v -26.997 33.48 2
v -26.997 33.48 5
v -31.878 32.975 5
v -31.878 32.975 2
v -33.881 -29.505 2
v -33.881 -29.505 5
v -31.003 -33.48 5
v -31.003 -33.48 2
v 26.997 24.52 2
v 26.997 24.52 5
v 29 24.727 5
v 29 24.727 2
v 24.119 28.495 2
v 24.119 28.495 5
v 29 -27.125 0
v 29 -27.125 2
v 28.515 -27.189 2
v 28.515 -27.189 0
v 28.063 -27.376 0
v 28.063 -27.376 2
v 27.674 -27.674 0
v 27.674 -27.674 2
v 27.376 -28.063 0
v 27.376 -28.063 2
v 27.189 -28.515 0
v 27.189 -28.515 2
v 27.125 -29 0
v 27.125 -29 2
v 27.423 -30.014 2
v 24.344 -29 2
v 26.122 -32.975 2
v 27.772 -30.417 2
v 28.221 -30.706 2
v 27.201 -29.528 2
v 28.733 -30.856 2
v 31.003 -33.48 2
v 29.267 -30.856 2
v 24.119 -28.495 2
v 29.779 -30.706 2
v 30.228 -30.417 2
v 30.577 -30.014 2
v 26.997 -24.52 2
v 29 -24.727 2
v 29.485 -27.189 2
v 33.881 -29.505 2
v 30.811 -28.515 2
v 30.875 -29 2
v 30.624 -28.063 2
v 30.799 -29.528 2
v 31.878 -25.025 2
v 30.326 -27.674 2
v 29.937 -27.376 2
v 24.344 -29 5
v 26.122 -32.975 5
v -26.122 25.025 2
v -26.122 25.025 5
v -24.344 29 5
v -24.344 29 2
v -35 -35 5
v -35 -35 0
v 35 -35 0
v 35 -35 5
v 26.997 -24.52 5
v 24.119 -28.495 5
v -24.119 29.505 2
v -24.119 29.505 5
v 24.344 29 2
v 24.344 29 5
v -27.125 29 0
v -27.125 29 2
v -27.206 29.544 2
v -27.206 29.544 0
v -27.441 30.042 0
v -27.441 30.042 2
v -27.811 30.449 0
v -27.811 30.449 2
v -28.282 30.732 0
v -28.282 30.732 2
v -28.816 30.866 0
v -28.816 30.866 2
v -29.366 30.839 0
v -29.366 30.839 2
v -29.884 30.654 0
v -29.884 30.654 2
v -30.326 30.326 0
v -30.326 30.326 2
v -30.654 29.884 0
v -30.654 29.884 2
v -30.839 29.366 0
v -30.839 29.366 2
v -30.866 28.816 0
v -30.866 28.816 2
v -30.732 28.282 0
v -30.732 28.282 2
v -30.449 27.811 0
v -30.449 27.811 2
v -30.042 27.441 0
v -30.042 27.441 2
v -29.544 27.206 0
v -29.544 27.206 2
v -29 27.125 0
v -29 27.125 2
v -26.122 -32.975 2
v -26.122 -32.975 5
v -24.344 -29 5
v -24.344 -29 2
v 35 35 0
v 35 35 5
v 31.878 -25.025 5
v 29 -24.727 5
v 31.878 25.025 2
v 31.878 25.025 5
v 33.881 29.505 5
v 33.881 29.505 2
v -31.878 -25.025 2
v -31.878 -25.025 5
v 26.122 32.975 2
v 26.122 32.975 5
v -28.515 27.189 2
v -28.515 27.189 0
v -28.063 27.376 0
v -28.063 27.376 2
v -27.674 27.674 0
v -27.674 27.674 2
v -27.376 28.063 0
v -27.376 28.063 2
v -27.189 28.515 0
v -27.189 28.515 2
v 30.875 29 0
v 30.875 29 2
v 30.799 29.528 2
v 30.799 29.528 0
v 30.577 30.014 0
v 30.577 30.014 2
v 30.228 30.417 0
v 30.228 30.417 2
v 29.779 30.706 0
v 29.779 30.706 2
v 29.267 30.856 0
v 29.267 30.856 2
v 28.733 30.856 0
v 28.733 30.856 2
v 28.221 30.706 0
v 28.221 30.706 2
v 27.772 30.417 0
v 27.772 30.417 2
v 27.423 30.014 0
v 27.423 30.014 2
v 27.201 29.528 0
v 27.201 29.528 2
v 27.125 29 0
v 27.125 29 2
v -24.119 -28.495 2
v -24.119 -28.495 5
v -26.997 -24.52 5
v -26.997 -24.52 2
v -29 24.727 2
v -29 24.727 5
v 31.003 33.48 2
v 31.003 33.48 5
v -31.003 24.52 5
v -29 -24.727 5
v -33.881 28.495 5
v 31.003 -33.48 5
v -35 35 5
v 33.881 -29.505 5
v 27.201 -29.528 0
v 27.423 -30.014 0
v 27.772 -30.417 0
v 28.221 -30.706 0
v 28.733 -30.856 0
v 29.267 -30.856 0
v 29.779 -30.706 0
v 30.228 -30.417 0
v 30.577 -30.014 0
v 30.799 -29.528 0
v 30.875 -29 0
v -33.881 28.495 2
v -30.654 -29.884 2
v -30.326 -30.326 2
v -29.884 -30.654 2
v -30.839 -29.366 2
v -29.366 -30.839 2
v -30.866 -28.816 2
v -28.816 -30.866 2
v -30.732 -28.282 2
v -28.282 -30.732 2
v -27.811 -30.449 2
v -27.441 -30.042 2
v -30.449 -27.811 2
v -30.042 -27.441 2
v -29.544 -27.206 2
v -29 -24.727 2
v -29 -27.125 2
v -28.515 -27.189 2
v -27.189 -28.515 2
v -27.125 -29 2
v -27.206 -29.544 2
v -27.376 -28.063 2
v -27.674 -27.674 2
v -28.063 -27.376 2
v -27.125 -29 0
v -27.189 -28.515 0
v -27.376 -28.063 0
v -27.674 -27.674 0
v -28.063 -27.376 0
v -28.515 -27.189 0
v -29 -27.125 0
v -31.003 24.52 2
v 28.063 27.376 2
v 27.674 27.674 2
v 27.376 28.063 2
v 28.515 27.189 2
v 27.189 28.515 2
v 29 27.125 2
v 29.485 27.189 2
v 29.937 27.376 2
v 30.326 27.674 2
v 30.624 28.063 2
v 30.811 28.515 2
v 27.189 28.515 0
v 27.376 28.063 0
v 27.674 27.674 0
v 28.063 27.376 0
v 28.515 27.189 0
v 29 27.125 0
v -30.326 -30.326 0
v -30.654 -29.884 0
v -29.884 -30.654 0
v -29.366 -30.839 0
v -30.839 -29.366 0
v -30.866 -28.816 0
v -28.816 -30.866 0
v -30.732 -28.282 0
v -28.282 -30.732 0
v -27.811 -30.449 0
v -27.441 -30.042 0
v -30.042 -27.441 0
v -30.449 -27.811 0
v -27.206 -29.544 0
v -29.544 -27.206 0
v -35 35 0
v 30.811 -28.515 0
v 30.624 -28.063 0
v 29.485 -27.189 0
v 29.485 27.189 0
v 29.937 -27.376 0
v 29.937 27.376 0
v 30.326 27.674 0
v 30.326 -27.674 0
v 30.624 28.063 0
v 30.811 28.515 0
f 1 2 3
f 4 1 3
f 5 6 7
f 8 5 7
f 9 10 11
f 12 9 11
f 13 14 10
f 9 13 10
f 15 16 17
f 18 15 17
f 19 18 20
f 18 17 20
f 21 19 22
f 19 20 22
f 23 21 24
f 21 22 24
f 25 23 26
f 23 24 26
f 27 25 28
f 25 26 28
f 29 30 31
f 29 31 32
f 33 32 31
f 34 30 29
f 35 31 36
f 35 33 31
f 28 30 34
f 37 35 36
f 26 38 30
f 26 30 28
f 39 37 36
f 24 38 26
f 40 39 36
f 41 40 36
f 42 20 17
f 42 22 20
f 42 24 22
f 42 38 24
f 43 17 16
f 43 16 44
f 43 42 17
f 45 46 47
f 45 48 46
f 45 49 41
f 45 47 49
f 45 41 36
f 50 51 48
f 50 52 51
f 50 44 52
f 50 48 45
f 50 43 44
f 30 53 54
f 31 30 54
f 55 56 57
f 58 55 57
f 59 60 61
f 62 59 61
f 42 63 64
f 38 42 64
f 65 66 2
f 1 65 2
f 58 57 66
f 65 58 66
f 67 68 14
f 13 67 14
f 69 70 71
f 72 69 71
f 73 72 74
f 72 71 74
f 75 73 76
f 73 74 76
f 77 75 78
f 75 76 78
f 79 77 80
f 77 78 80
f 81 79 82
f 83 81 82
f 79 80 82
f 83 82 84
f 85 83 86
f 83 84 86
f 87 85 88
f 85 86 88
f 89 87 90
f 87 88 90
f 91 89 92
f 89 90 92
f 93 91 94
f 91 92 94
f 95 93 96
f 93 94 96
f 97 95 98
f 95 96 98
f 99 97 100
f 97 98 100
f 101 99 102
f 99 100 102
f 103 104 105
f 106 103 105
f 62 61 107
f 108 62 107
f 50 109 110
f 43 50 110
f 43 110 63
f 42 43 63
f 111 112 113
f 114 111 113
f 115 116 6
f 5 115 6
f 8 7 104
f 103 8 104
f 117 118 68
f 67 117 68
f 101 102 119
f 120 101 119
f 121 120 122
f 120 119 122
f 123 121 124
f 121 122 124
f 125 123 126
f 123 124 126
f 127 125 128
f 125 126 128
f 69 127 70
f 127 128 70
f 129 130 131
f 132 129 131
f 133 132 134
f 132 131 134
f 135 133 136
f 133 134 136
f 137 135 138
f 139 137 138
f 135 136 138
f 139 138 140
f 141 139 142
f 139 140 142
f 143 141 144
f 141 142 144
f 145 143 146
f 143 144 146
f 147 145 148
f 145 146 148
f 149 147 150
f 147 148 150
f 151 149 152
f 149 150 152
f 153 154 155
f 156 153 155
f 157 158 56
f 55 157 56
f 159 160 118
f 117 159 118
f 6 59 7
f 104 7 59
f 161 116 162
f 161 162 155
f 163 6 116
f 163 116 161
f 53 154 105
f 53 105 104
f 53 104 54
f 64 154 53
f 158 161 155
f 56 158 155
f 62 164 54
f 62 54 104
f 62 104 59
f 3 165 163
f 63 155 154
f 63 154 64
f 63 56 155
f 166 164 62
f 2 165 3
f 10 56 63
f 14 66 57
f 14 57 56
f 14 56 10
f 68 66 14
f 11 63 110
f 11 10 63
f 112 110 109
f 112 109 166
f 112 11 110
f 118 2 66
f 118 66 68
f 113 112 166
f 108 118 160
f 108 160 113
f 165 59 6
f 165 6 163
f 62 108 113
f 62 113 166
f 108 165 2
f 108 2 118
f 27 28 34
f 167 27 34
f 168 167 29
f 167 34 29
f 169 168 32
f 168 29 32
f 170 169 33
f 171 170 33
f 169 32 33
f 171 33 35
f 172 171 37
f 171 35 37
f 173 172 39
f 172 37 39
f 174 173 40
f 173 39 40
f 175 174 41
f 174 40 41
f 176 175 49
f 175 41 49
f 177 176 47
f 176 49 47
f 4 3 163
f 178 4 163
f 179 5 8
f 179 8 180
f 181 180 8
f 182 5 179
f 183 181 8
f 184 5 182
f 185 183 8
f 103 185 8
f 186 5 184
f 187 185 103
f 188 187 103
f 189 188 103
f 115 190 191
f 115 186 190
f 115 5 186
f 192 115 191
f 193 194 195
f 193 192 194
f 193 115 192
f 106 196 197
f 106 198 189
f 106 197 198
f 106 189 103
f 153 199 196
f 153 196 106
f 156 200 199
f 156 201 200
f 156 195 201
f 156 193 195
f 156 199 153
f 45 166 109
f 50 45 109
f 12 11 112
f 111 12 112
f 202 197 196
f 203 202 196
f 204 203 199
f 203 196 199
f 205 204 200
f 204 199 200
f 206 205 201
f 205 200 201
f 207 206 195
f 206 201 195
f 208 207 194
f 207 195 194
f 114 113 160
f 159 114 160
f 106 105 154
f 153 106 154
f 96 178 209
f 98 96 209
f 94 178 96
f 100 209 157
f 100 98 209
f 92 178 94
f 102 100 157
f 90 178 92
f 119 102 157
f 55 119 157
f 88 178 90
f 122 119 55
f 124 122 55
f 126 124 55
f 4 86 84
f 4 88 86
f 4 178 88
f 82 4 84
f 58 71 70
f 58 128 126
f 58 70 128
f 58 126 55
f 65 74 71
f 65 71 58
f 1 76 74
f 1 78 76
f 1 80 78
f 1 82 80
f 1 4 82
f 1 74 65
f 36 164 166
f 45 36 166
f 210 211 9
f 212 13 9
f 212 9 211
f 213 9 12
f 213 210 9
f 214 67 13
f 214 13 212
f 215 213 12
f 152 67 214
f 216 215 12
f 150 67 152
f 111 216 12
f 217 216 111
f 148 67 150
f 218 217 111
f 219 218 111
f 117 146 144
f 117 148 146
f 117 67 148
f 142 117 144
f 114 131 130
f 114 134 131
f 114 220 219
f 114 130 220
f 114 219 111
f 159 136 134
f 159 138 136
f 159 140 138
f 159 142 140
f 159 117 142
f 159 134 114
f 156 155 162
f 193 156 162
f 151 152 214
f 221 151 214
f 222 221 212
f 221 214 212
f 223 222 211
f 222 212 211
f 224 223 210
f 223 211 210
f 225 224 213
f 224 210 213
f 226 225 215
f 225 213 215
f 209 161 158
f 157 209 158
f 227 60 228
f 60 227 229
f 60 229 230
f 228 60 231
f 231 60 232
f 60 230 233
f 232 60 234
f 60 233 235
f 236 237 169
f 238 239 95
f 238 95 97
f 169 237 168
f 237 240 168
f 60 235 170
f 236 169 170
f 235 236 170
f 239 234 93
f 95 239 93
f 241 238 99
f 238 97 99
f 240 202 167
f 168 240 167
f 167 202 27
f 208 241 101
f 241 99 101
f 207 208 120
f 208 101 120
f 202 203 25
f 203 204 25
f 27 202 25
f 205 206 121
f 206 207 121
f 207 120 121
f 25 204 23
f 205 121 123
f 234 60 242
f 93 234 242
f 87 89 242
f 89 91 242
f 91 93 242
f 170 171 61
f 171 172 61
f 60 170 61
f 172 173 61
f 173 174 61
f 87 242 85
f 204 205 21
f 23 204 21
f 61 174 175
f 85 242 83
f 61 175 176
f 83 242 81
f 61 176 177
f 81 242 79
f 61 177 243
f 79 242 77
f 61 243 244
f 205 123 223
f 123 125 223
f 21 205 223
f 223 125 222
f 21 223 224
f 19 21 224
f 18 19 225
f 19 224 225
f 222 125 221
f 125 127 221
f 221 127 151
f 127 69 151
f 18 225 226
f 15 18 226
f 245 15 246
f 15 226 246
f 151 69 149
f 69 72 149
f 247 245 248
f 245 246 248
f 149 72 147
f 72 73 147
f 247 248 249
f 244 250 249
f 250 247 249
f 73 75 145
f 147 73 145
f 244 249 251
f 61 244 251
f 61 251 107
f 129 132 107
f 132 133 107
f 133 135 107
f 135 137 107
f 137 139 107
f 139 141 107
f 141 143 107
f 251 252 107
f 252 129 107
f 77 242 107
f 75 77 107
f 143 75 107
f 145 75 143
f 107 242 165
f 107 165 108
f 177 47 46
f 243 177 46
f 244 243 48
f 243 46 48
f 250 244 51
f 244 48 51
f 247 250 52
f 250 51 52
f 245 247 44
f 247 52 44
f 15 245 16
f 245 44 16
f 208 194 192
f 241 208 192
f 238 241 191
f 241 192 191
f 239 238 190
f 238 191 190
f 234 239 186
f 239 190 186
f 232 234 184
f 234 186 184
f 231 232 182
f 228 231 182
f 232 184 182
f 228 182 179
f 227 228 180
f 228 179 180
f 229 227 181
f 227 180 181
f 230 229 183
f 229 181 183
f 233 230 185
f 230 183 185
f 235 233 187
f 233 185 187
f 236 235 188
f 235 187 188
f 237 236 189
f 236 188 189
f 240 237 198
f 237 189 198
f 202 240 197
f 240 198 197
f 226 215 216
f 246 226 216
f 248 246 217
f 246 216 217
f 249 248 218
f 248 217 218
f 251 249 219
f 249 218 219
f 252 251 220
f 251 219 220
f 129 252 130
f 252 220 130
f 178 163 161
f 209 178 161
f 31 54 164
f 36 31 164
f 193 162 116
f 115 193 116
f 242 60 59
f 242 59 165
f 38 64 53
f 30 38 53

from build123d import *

# Parameters (mm, degrees)
F0_W     = 70
F0_H     = 70
F1_DEPTH = 5
F3_DEPTH = 3
F5_DEPTH = 25


with BuildPart() as f1:
    # F0 (on Top) → F1 (new body)
    with BuildSketch(Plane.XY):
        Rectangle(F0_W, F0_H)
    extrude(amount=F1_DEPTH)

    # F2 (on face) → F3 (cut)
    with BuildSketch(Plane.XY.offset(5)):
        Polygon((-29, -24.727326), (-29, -29), (-24.344364, -29), (-24.118565, -28.495094), (-26.996544, -24.520101), align=None)
        Polygon((-24.344364, -29), (-29, -29), (-29, -24.727326), (-31.877979, -25.025007), (-33.881435, -29.504906), (-31.003456, -33.479899), (-26.122021, -32.974993), align=None)
        Polygon((24.118565, -28.495094), (24.344364, -29), (29, -29), (29, -24.727326), (26.996544, -24.520101), align=None)
        Polygon((29, -29), (24.344364, -29), (26.122021, -32.974993), (31.003456, -33.479899), (33.881435, -29.504906), (31.877979, -25.025007), (29, -24.727326), align=None)
        Polygon((-31.003456, 24.520101), (-29, 24.727326), (-29, 29), (-24.344364, 29), (-24.118565, 29.504906), (-26.996544, 33.479899), (-31.877979, 32.974993), (-33.881435, 28.495094), align=None)
        Polygon((-29, 29), (-29, 24.727326), (-26.122021, 25.025007), (-24.344364, 29), align=None)
        Polygon((26.996544, 24.520101), (29, 24.727326), (29, 29), (24.344364, 29), (24.118565, 28.495094), align=None)
        Polygon((29, 29), (29, 24.727326), (31.877979, 25.025007), (33.881435, 29.504906), (31.003456, 33.479899), (26.122021, 32.974993), (24.344364, 29), align=None)
    extrude(amount=-F3_DEPTH, mode=Mode.SUBTRACT)

    # F4 (on face) → F5 (cut)
    with BuildSketch(Plane.XY.offset(5)):
        with BuildLine():
            Line((-29, -27.125), (-29, -29))
            Line((-29, -29), (-27.125, -29))
            ThreePointArc((-27.125, -29), (-27.674175, -27.674175), (-29, -27.125))
        make_face()
        with BuildLine():
            Line((-27.125, -29), (-29, -29))
            Line((-29, -29), (-29, -27.125))
            ThreePointArc((-29, -27.125), (-30.325825, -30.325825), (-27.125, -29))
        make_face()
        with BuildLine():
            ThreePointArc((29, -27.125), (27.674175, -27.674175), (27.125, -29))
            Line((27.125, -29), (29, -29))
            Line((29, -29), (29, -27.125))
        make_face()
        with BuildLine():
            Line((29, -29), (27.125, -29))
            ThreePointArc((27.125, -29), (29, -30.875), (30.875, -29))
            ThreePointArc((30.875, -29), (30.325825, -27.674175), (29, -27.125))
            Line((29, -27.125), (29, -29))
        make_face()
        with BuildLine():
            ThreePointArc((-27.125, 29), (-30.325825, 30.325825), (-29, 27.125))
            Line((-29, 27.125), (-29, 29))
            Line((-29, 29), (-27.125, 29))
        make_face()
        with BuildLine():
            Line((-29, 29), (-29, 27.125))
            ThreePointArc((-29, 27.125), (-27.674175, 27.674175), (-27.125, 29))
            Line((-27.125, 29), (-29, 29))
        make_face()
        with BuildLine():
            Line((29, 29), (27.125, 29))
            ThreePointArc((27.125, 29), (27.674175, 27.674175), (29, 27.125))
            Line((29, 27.125), (29, 29))
        make_face()
        with BuildLine():
            ThreePointArc((30.875, 29), (29, 30.875), (27.125, 29))
            Line((27.125, 29), (29, 29))
            Line((29, 29), (29, 27.125))
            ThreePointArc((29, 27.125), (30.325825, 27.674175), (30.875, 29))
        make_face()
    extrude(amount=-F5_DEPTH, mode=Mode.SUBTRACT)


solid = f1.part
